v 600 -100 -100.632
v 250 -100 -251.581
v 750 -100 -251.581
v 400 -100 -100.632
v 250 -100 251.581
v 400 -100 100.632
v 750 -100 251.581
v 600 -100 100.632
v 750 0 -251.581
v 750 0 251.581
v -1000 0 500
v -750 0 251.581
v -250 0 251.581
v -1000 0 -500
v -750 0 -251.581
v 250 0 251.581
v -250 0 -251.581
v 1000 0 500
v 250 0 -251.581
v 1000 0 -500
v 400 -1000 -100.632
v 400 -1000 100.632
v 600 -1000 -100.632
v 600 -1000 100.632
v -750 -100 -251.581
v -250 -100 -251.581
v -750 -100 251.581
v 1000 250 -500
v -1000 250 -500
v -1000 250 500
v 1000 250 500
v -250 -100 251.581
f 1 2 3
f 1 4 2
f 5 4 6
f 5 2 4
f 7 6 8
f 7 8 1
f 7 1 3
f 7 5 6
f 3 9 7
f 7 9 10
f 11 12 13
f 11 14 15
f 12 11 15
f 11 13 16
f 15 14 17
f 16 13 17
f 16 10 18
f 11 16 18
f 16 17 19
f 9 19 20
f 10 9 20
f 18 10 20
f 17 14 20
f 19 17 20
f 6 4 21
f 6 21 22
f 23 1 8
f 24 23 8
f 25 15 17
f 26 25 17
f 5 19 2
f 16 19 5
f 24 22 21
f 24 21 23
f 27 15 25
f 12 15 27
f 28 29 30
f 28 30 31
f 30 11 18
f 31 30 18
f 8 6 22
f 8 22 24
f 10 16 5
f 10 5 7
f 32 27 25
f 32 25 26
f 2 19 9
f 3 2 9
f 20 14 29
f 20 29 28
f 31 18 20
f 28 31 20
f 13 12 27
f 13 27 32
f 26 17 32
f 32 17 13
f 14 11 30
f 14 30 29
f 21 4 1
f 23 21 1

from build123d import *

# Parameters (mm, degrees)
SKETCH2_W           = 2000
SKETCH2_H           = 1000
BOSS_EXTRUDE1_DEPTH = 250
SKETCH3_W           = 500
SKETCH3_H           = 503.161668984
BOSS_EXTRUDE2_DEPTH = 100
SKETCH4_W           = 200
SKETCH4_H           = 201.264667594
BOSS_EXTRUDE3_DEPTH = 900


with BuildPart() as part:
    # Sketch2 → Boss-Extrude1 (new body)
    with BuildSketch(Plane(origin=(0, 0, 0), x_dir=(1, 0, 0), z_dir=(0, 1, 0))):
        Rectangle(SKETCH2_W, SKETCH2_H)
    extrude(amount=BOSS_EXTRUDE1_DEPTH)

    # Sketch3 → Boss-Extrude2 (add)
    with BuildSketch(Plane.XZ):
        with Locations((-500, 0)):
            Rectangle(SKETCH3_W, SKETCH3_H)
        with Locations((500, 0)):
            Rectangle(SKETCH3_W, SKETCH3_H)
    extrude(amount=BOSS_EXTRUDE2_DEPTH)

    # Sketch4 → Boss-Extrude3 (add)
    with BuildSketch(Plane.XZ.offset(100)):
        with Locations((500, 0)):
            Rectangle(SKETCH4_W, SKETCH4_H)
    extrude(amount=BOSS_EXTRUDE3_DEPTH)


solid = part.part
